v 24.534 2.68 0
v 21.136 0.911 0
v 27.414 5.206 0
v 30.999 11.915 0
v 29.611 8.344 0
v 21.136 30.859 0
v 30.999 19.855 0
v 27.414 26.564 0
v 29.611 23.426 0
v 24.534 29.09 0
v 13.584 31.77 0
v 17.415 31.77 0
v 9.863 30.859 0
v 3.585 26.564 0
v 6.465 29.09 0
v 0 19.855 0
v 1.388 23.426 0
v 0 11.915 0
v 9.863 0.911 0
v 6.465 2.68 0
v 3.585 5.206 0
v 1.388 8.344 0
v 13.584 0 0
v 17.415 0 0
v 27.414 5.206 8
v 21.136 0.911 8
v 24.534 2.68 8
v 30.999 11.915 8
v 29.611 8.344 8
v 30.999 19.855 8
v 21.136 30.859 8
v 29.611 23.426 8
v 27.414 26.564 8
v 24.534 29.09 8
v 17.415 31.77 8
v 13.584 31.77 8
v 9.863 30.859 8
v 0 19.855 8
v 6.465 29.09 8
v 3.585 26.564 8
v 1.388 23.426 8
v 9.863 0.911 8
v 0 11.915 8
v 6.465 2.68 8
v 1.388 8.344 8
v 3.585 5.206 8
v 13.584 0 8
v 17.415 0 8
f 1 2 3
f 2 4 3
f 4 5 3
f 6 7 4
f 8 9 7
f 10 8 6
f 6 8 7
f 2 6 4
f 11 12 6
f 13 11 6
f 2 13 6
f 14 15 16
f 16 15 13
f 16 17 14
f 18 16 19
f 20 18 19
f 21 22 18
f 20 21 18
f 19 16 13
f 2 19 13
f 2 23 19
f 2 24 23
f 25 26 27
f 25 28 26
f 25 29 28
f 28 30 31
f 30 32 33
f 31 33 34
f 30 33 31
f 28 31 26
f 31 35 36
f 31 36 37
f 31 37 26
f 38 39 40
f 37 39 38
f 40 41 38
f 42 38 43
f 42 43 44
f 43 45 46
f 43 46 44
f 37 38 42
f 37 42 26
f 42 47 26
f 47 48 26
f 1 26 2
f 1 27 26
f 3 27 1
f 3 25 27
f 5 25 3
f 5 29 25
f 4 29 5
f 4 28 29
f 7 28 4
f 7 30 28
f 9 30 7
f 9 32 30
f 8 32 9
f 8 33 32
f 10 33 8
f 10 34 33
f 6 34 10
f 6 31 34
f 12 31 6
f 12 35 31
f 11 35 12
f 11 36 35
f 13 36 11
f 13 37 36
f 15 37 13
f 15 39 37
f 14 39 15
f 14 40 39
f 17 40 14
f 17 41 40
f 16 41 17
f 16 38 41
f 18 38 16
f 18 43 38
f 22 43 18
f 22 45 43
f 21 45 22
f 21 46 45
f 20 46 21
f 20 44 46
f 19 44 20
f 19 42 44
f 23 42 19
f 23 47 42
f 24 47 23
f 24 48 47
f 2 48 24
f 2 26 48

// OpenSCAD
$fn = 32;

// ----------------------------------------------------------------------
// Flat adaptor: double_d, 8 mm thick
// ----------------------------------------------------------------------

// --- parameters (mm) ---
profile_height = 8;       // extrusion height
profile_points = 24;      // points of the closed outline

profile = [[30.999, 19.855], [29.611, 23.426], [27.414, 26.564], [24.534, 29.09], [21.136, 30.859], [17.415, 31.77], [13.584, 31.77], [9.863, 30.859], [6.465, 29.09], [3.585, 26.564], [1.388, 23.426], [0, 19.855], [0, 11.915], [1.388, 8.344], [3.585, 5.206], [6.465, 2.68], [9.863, 0.911], [13.584, 0], [17.415, 0], [21.136, 0.911], [24.534, 2.68], [27.414, 5.206], [29.611, 8.344], [30.999, 11.915]];  // single closed polygon, 24 points, counter clockwise

// --- the one profile operation ---
linear_extrude(height = profile_height) polygon(points = profile);
